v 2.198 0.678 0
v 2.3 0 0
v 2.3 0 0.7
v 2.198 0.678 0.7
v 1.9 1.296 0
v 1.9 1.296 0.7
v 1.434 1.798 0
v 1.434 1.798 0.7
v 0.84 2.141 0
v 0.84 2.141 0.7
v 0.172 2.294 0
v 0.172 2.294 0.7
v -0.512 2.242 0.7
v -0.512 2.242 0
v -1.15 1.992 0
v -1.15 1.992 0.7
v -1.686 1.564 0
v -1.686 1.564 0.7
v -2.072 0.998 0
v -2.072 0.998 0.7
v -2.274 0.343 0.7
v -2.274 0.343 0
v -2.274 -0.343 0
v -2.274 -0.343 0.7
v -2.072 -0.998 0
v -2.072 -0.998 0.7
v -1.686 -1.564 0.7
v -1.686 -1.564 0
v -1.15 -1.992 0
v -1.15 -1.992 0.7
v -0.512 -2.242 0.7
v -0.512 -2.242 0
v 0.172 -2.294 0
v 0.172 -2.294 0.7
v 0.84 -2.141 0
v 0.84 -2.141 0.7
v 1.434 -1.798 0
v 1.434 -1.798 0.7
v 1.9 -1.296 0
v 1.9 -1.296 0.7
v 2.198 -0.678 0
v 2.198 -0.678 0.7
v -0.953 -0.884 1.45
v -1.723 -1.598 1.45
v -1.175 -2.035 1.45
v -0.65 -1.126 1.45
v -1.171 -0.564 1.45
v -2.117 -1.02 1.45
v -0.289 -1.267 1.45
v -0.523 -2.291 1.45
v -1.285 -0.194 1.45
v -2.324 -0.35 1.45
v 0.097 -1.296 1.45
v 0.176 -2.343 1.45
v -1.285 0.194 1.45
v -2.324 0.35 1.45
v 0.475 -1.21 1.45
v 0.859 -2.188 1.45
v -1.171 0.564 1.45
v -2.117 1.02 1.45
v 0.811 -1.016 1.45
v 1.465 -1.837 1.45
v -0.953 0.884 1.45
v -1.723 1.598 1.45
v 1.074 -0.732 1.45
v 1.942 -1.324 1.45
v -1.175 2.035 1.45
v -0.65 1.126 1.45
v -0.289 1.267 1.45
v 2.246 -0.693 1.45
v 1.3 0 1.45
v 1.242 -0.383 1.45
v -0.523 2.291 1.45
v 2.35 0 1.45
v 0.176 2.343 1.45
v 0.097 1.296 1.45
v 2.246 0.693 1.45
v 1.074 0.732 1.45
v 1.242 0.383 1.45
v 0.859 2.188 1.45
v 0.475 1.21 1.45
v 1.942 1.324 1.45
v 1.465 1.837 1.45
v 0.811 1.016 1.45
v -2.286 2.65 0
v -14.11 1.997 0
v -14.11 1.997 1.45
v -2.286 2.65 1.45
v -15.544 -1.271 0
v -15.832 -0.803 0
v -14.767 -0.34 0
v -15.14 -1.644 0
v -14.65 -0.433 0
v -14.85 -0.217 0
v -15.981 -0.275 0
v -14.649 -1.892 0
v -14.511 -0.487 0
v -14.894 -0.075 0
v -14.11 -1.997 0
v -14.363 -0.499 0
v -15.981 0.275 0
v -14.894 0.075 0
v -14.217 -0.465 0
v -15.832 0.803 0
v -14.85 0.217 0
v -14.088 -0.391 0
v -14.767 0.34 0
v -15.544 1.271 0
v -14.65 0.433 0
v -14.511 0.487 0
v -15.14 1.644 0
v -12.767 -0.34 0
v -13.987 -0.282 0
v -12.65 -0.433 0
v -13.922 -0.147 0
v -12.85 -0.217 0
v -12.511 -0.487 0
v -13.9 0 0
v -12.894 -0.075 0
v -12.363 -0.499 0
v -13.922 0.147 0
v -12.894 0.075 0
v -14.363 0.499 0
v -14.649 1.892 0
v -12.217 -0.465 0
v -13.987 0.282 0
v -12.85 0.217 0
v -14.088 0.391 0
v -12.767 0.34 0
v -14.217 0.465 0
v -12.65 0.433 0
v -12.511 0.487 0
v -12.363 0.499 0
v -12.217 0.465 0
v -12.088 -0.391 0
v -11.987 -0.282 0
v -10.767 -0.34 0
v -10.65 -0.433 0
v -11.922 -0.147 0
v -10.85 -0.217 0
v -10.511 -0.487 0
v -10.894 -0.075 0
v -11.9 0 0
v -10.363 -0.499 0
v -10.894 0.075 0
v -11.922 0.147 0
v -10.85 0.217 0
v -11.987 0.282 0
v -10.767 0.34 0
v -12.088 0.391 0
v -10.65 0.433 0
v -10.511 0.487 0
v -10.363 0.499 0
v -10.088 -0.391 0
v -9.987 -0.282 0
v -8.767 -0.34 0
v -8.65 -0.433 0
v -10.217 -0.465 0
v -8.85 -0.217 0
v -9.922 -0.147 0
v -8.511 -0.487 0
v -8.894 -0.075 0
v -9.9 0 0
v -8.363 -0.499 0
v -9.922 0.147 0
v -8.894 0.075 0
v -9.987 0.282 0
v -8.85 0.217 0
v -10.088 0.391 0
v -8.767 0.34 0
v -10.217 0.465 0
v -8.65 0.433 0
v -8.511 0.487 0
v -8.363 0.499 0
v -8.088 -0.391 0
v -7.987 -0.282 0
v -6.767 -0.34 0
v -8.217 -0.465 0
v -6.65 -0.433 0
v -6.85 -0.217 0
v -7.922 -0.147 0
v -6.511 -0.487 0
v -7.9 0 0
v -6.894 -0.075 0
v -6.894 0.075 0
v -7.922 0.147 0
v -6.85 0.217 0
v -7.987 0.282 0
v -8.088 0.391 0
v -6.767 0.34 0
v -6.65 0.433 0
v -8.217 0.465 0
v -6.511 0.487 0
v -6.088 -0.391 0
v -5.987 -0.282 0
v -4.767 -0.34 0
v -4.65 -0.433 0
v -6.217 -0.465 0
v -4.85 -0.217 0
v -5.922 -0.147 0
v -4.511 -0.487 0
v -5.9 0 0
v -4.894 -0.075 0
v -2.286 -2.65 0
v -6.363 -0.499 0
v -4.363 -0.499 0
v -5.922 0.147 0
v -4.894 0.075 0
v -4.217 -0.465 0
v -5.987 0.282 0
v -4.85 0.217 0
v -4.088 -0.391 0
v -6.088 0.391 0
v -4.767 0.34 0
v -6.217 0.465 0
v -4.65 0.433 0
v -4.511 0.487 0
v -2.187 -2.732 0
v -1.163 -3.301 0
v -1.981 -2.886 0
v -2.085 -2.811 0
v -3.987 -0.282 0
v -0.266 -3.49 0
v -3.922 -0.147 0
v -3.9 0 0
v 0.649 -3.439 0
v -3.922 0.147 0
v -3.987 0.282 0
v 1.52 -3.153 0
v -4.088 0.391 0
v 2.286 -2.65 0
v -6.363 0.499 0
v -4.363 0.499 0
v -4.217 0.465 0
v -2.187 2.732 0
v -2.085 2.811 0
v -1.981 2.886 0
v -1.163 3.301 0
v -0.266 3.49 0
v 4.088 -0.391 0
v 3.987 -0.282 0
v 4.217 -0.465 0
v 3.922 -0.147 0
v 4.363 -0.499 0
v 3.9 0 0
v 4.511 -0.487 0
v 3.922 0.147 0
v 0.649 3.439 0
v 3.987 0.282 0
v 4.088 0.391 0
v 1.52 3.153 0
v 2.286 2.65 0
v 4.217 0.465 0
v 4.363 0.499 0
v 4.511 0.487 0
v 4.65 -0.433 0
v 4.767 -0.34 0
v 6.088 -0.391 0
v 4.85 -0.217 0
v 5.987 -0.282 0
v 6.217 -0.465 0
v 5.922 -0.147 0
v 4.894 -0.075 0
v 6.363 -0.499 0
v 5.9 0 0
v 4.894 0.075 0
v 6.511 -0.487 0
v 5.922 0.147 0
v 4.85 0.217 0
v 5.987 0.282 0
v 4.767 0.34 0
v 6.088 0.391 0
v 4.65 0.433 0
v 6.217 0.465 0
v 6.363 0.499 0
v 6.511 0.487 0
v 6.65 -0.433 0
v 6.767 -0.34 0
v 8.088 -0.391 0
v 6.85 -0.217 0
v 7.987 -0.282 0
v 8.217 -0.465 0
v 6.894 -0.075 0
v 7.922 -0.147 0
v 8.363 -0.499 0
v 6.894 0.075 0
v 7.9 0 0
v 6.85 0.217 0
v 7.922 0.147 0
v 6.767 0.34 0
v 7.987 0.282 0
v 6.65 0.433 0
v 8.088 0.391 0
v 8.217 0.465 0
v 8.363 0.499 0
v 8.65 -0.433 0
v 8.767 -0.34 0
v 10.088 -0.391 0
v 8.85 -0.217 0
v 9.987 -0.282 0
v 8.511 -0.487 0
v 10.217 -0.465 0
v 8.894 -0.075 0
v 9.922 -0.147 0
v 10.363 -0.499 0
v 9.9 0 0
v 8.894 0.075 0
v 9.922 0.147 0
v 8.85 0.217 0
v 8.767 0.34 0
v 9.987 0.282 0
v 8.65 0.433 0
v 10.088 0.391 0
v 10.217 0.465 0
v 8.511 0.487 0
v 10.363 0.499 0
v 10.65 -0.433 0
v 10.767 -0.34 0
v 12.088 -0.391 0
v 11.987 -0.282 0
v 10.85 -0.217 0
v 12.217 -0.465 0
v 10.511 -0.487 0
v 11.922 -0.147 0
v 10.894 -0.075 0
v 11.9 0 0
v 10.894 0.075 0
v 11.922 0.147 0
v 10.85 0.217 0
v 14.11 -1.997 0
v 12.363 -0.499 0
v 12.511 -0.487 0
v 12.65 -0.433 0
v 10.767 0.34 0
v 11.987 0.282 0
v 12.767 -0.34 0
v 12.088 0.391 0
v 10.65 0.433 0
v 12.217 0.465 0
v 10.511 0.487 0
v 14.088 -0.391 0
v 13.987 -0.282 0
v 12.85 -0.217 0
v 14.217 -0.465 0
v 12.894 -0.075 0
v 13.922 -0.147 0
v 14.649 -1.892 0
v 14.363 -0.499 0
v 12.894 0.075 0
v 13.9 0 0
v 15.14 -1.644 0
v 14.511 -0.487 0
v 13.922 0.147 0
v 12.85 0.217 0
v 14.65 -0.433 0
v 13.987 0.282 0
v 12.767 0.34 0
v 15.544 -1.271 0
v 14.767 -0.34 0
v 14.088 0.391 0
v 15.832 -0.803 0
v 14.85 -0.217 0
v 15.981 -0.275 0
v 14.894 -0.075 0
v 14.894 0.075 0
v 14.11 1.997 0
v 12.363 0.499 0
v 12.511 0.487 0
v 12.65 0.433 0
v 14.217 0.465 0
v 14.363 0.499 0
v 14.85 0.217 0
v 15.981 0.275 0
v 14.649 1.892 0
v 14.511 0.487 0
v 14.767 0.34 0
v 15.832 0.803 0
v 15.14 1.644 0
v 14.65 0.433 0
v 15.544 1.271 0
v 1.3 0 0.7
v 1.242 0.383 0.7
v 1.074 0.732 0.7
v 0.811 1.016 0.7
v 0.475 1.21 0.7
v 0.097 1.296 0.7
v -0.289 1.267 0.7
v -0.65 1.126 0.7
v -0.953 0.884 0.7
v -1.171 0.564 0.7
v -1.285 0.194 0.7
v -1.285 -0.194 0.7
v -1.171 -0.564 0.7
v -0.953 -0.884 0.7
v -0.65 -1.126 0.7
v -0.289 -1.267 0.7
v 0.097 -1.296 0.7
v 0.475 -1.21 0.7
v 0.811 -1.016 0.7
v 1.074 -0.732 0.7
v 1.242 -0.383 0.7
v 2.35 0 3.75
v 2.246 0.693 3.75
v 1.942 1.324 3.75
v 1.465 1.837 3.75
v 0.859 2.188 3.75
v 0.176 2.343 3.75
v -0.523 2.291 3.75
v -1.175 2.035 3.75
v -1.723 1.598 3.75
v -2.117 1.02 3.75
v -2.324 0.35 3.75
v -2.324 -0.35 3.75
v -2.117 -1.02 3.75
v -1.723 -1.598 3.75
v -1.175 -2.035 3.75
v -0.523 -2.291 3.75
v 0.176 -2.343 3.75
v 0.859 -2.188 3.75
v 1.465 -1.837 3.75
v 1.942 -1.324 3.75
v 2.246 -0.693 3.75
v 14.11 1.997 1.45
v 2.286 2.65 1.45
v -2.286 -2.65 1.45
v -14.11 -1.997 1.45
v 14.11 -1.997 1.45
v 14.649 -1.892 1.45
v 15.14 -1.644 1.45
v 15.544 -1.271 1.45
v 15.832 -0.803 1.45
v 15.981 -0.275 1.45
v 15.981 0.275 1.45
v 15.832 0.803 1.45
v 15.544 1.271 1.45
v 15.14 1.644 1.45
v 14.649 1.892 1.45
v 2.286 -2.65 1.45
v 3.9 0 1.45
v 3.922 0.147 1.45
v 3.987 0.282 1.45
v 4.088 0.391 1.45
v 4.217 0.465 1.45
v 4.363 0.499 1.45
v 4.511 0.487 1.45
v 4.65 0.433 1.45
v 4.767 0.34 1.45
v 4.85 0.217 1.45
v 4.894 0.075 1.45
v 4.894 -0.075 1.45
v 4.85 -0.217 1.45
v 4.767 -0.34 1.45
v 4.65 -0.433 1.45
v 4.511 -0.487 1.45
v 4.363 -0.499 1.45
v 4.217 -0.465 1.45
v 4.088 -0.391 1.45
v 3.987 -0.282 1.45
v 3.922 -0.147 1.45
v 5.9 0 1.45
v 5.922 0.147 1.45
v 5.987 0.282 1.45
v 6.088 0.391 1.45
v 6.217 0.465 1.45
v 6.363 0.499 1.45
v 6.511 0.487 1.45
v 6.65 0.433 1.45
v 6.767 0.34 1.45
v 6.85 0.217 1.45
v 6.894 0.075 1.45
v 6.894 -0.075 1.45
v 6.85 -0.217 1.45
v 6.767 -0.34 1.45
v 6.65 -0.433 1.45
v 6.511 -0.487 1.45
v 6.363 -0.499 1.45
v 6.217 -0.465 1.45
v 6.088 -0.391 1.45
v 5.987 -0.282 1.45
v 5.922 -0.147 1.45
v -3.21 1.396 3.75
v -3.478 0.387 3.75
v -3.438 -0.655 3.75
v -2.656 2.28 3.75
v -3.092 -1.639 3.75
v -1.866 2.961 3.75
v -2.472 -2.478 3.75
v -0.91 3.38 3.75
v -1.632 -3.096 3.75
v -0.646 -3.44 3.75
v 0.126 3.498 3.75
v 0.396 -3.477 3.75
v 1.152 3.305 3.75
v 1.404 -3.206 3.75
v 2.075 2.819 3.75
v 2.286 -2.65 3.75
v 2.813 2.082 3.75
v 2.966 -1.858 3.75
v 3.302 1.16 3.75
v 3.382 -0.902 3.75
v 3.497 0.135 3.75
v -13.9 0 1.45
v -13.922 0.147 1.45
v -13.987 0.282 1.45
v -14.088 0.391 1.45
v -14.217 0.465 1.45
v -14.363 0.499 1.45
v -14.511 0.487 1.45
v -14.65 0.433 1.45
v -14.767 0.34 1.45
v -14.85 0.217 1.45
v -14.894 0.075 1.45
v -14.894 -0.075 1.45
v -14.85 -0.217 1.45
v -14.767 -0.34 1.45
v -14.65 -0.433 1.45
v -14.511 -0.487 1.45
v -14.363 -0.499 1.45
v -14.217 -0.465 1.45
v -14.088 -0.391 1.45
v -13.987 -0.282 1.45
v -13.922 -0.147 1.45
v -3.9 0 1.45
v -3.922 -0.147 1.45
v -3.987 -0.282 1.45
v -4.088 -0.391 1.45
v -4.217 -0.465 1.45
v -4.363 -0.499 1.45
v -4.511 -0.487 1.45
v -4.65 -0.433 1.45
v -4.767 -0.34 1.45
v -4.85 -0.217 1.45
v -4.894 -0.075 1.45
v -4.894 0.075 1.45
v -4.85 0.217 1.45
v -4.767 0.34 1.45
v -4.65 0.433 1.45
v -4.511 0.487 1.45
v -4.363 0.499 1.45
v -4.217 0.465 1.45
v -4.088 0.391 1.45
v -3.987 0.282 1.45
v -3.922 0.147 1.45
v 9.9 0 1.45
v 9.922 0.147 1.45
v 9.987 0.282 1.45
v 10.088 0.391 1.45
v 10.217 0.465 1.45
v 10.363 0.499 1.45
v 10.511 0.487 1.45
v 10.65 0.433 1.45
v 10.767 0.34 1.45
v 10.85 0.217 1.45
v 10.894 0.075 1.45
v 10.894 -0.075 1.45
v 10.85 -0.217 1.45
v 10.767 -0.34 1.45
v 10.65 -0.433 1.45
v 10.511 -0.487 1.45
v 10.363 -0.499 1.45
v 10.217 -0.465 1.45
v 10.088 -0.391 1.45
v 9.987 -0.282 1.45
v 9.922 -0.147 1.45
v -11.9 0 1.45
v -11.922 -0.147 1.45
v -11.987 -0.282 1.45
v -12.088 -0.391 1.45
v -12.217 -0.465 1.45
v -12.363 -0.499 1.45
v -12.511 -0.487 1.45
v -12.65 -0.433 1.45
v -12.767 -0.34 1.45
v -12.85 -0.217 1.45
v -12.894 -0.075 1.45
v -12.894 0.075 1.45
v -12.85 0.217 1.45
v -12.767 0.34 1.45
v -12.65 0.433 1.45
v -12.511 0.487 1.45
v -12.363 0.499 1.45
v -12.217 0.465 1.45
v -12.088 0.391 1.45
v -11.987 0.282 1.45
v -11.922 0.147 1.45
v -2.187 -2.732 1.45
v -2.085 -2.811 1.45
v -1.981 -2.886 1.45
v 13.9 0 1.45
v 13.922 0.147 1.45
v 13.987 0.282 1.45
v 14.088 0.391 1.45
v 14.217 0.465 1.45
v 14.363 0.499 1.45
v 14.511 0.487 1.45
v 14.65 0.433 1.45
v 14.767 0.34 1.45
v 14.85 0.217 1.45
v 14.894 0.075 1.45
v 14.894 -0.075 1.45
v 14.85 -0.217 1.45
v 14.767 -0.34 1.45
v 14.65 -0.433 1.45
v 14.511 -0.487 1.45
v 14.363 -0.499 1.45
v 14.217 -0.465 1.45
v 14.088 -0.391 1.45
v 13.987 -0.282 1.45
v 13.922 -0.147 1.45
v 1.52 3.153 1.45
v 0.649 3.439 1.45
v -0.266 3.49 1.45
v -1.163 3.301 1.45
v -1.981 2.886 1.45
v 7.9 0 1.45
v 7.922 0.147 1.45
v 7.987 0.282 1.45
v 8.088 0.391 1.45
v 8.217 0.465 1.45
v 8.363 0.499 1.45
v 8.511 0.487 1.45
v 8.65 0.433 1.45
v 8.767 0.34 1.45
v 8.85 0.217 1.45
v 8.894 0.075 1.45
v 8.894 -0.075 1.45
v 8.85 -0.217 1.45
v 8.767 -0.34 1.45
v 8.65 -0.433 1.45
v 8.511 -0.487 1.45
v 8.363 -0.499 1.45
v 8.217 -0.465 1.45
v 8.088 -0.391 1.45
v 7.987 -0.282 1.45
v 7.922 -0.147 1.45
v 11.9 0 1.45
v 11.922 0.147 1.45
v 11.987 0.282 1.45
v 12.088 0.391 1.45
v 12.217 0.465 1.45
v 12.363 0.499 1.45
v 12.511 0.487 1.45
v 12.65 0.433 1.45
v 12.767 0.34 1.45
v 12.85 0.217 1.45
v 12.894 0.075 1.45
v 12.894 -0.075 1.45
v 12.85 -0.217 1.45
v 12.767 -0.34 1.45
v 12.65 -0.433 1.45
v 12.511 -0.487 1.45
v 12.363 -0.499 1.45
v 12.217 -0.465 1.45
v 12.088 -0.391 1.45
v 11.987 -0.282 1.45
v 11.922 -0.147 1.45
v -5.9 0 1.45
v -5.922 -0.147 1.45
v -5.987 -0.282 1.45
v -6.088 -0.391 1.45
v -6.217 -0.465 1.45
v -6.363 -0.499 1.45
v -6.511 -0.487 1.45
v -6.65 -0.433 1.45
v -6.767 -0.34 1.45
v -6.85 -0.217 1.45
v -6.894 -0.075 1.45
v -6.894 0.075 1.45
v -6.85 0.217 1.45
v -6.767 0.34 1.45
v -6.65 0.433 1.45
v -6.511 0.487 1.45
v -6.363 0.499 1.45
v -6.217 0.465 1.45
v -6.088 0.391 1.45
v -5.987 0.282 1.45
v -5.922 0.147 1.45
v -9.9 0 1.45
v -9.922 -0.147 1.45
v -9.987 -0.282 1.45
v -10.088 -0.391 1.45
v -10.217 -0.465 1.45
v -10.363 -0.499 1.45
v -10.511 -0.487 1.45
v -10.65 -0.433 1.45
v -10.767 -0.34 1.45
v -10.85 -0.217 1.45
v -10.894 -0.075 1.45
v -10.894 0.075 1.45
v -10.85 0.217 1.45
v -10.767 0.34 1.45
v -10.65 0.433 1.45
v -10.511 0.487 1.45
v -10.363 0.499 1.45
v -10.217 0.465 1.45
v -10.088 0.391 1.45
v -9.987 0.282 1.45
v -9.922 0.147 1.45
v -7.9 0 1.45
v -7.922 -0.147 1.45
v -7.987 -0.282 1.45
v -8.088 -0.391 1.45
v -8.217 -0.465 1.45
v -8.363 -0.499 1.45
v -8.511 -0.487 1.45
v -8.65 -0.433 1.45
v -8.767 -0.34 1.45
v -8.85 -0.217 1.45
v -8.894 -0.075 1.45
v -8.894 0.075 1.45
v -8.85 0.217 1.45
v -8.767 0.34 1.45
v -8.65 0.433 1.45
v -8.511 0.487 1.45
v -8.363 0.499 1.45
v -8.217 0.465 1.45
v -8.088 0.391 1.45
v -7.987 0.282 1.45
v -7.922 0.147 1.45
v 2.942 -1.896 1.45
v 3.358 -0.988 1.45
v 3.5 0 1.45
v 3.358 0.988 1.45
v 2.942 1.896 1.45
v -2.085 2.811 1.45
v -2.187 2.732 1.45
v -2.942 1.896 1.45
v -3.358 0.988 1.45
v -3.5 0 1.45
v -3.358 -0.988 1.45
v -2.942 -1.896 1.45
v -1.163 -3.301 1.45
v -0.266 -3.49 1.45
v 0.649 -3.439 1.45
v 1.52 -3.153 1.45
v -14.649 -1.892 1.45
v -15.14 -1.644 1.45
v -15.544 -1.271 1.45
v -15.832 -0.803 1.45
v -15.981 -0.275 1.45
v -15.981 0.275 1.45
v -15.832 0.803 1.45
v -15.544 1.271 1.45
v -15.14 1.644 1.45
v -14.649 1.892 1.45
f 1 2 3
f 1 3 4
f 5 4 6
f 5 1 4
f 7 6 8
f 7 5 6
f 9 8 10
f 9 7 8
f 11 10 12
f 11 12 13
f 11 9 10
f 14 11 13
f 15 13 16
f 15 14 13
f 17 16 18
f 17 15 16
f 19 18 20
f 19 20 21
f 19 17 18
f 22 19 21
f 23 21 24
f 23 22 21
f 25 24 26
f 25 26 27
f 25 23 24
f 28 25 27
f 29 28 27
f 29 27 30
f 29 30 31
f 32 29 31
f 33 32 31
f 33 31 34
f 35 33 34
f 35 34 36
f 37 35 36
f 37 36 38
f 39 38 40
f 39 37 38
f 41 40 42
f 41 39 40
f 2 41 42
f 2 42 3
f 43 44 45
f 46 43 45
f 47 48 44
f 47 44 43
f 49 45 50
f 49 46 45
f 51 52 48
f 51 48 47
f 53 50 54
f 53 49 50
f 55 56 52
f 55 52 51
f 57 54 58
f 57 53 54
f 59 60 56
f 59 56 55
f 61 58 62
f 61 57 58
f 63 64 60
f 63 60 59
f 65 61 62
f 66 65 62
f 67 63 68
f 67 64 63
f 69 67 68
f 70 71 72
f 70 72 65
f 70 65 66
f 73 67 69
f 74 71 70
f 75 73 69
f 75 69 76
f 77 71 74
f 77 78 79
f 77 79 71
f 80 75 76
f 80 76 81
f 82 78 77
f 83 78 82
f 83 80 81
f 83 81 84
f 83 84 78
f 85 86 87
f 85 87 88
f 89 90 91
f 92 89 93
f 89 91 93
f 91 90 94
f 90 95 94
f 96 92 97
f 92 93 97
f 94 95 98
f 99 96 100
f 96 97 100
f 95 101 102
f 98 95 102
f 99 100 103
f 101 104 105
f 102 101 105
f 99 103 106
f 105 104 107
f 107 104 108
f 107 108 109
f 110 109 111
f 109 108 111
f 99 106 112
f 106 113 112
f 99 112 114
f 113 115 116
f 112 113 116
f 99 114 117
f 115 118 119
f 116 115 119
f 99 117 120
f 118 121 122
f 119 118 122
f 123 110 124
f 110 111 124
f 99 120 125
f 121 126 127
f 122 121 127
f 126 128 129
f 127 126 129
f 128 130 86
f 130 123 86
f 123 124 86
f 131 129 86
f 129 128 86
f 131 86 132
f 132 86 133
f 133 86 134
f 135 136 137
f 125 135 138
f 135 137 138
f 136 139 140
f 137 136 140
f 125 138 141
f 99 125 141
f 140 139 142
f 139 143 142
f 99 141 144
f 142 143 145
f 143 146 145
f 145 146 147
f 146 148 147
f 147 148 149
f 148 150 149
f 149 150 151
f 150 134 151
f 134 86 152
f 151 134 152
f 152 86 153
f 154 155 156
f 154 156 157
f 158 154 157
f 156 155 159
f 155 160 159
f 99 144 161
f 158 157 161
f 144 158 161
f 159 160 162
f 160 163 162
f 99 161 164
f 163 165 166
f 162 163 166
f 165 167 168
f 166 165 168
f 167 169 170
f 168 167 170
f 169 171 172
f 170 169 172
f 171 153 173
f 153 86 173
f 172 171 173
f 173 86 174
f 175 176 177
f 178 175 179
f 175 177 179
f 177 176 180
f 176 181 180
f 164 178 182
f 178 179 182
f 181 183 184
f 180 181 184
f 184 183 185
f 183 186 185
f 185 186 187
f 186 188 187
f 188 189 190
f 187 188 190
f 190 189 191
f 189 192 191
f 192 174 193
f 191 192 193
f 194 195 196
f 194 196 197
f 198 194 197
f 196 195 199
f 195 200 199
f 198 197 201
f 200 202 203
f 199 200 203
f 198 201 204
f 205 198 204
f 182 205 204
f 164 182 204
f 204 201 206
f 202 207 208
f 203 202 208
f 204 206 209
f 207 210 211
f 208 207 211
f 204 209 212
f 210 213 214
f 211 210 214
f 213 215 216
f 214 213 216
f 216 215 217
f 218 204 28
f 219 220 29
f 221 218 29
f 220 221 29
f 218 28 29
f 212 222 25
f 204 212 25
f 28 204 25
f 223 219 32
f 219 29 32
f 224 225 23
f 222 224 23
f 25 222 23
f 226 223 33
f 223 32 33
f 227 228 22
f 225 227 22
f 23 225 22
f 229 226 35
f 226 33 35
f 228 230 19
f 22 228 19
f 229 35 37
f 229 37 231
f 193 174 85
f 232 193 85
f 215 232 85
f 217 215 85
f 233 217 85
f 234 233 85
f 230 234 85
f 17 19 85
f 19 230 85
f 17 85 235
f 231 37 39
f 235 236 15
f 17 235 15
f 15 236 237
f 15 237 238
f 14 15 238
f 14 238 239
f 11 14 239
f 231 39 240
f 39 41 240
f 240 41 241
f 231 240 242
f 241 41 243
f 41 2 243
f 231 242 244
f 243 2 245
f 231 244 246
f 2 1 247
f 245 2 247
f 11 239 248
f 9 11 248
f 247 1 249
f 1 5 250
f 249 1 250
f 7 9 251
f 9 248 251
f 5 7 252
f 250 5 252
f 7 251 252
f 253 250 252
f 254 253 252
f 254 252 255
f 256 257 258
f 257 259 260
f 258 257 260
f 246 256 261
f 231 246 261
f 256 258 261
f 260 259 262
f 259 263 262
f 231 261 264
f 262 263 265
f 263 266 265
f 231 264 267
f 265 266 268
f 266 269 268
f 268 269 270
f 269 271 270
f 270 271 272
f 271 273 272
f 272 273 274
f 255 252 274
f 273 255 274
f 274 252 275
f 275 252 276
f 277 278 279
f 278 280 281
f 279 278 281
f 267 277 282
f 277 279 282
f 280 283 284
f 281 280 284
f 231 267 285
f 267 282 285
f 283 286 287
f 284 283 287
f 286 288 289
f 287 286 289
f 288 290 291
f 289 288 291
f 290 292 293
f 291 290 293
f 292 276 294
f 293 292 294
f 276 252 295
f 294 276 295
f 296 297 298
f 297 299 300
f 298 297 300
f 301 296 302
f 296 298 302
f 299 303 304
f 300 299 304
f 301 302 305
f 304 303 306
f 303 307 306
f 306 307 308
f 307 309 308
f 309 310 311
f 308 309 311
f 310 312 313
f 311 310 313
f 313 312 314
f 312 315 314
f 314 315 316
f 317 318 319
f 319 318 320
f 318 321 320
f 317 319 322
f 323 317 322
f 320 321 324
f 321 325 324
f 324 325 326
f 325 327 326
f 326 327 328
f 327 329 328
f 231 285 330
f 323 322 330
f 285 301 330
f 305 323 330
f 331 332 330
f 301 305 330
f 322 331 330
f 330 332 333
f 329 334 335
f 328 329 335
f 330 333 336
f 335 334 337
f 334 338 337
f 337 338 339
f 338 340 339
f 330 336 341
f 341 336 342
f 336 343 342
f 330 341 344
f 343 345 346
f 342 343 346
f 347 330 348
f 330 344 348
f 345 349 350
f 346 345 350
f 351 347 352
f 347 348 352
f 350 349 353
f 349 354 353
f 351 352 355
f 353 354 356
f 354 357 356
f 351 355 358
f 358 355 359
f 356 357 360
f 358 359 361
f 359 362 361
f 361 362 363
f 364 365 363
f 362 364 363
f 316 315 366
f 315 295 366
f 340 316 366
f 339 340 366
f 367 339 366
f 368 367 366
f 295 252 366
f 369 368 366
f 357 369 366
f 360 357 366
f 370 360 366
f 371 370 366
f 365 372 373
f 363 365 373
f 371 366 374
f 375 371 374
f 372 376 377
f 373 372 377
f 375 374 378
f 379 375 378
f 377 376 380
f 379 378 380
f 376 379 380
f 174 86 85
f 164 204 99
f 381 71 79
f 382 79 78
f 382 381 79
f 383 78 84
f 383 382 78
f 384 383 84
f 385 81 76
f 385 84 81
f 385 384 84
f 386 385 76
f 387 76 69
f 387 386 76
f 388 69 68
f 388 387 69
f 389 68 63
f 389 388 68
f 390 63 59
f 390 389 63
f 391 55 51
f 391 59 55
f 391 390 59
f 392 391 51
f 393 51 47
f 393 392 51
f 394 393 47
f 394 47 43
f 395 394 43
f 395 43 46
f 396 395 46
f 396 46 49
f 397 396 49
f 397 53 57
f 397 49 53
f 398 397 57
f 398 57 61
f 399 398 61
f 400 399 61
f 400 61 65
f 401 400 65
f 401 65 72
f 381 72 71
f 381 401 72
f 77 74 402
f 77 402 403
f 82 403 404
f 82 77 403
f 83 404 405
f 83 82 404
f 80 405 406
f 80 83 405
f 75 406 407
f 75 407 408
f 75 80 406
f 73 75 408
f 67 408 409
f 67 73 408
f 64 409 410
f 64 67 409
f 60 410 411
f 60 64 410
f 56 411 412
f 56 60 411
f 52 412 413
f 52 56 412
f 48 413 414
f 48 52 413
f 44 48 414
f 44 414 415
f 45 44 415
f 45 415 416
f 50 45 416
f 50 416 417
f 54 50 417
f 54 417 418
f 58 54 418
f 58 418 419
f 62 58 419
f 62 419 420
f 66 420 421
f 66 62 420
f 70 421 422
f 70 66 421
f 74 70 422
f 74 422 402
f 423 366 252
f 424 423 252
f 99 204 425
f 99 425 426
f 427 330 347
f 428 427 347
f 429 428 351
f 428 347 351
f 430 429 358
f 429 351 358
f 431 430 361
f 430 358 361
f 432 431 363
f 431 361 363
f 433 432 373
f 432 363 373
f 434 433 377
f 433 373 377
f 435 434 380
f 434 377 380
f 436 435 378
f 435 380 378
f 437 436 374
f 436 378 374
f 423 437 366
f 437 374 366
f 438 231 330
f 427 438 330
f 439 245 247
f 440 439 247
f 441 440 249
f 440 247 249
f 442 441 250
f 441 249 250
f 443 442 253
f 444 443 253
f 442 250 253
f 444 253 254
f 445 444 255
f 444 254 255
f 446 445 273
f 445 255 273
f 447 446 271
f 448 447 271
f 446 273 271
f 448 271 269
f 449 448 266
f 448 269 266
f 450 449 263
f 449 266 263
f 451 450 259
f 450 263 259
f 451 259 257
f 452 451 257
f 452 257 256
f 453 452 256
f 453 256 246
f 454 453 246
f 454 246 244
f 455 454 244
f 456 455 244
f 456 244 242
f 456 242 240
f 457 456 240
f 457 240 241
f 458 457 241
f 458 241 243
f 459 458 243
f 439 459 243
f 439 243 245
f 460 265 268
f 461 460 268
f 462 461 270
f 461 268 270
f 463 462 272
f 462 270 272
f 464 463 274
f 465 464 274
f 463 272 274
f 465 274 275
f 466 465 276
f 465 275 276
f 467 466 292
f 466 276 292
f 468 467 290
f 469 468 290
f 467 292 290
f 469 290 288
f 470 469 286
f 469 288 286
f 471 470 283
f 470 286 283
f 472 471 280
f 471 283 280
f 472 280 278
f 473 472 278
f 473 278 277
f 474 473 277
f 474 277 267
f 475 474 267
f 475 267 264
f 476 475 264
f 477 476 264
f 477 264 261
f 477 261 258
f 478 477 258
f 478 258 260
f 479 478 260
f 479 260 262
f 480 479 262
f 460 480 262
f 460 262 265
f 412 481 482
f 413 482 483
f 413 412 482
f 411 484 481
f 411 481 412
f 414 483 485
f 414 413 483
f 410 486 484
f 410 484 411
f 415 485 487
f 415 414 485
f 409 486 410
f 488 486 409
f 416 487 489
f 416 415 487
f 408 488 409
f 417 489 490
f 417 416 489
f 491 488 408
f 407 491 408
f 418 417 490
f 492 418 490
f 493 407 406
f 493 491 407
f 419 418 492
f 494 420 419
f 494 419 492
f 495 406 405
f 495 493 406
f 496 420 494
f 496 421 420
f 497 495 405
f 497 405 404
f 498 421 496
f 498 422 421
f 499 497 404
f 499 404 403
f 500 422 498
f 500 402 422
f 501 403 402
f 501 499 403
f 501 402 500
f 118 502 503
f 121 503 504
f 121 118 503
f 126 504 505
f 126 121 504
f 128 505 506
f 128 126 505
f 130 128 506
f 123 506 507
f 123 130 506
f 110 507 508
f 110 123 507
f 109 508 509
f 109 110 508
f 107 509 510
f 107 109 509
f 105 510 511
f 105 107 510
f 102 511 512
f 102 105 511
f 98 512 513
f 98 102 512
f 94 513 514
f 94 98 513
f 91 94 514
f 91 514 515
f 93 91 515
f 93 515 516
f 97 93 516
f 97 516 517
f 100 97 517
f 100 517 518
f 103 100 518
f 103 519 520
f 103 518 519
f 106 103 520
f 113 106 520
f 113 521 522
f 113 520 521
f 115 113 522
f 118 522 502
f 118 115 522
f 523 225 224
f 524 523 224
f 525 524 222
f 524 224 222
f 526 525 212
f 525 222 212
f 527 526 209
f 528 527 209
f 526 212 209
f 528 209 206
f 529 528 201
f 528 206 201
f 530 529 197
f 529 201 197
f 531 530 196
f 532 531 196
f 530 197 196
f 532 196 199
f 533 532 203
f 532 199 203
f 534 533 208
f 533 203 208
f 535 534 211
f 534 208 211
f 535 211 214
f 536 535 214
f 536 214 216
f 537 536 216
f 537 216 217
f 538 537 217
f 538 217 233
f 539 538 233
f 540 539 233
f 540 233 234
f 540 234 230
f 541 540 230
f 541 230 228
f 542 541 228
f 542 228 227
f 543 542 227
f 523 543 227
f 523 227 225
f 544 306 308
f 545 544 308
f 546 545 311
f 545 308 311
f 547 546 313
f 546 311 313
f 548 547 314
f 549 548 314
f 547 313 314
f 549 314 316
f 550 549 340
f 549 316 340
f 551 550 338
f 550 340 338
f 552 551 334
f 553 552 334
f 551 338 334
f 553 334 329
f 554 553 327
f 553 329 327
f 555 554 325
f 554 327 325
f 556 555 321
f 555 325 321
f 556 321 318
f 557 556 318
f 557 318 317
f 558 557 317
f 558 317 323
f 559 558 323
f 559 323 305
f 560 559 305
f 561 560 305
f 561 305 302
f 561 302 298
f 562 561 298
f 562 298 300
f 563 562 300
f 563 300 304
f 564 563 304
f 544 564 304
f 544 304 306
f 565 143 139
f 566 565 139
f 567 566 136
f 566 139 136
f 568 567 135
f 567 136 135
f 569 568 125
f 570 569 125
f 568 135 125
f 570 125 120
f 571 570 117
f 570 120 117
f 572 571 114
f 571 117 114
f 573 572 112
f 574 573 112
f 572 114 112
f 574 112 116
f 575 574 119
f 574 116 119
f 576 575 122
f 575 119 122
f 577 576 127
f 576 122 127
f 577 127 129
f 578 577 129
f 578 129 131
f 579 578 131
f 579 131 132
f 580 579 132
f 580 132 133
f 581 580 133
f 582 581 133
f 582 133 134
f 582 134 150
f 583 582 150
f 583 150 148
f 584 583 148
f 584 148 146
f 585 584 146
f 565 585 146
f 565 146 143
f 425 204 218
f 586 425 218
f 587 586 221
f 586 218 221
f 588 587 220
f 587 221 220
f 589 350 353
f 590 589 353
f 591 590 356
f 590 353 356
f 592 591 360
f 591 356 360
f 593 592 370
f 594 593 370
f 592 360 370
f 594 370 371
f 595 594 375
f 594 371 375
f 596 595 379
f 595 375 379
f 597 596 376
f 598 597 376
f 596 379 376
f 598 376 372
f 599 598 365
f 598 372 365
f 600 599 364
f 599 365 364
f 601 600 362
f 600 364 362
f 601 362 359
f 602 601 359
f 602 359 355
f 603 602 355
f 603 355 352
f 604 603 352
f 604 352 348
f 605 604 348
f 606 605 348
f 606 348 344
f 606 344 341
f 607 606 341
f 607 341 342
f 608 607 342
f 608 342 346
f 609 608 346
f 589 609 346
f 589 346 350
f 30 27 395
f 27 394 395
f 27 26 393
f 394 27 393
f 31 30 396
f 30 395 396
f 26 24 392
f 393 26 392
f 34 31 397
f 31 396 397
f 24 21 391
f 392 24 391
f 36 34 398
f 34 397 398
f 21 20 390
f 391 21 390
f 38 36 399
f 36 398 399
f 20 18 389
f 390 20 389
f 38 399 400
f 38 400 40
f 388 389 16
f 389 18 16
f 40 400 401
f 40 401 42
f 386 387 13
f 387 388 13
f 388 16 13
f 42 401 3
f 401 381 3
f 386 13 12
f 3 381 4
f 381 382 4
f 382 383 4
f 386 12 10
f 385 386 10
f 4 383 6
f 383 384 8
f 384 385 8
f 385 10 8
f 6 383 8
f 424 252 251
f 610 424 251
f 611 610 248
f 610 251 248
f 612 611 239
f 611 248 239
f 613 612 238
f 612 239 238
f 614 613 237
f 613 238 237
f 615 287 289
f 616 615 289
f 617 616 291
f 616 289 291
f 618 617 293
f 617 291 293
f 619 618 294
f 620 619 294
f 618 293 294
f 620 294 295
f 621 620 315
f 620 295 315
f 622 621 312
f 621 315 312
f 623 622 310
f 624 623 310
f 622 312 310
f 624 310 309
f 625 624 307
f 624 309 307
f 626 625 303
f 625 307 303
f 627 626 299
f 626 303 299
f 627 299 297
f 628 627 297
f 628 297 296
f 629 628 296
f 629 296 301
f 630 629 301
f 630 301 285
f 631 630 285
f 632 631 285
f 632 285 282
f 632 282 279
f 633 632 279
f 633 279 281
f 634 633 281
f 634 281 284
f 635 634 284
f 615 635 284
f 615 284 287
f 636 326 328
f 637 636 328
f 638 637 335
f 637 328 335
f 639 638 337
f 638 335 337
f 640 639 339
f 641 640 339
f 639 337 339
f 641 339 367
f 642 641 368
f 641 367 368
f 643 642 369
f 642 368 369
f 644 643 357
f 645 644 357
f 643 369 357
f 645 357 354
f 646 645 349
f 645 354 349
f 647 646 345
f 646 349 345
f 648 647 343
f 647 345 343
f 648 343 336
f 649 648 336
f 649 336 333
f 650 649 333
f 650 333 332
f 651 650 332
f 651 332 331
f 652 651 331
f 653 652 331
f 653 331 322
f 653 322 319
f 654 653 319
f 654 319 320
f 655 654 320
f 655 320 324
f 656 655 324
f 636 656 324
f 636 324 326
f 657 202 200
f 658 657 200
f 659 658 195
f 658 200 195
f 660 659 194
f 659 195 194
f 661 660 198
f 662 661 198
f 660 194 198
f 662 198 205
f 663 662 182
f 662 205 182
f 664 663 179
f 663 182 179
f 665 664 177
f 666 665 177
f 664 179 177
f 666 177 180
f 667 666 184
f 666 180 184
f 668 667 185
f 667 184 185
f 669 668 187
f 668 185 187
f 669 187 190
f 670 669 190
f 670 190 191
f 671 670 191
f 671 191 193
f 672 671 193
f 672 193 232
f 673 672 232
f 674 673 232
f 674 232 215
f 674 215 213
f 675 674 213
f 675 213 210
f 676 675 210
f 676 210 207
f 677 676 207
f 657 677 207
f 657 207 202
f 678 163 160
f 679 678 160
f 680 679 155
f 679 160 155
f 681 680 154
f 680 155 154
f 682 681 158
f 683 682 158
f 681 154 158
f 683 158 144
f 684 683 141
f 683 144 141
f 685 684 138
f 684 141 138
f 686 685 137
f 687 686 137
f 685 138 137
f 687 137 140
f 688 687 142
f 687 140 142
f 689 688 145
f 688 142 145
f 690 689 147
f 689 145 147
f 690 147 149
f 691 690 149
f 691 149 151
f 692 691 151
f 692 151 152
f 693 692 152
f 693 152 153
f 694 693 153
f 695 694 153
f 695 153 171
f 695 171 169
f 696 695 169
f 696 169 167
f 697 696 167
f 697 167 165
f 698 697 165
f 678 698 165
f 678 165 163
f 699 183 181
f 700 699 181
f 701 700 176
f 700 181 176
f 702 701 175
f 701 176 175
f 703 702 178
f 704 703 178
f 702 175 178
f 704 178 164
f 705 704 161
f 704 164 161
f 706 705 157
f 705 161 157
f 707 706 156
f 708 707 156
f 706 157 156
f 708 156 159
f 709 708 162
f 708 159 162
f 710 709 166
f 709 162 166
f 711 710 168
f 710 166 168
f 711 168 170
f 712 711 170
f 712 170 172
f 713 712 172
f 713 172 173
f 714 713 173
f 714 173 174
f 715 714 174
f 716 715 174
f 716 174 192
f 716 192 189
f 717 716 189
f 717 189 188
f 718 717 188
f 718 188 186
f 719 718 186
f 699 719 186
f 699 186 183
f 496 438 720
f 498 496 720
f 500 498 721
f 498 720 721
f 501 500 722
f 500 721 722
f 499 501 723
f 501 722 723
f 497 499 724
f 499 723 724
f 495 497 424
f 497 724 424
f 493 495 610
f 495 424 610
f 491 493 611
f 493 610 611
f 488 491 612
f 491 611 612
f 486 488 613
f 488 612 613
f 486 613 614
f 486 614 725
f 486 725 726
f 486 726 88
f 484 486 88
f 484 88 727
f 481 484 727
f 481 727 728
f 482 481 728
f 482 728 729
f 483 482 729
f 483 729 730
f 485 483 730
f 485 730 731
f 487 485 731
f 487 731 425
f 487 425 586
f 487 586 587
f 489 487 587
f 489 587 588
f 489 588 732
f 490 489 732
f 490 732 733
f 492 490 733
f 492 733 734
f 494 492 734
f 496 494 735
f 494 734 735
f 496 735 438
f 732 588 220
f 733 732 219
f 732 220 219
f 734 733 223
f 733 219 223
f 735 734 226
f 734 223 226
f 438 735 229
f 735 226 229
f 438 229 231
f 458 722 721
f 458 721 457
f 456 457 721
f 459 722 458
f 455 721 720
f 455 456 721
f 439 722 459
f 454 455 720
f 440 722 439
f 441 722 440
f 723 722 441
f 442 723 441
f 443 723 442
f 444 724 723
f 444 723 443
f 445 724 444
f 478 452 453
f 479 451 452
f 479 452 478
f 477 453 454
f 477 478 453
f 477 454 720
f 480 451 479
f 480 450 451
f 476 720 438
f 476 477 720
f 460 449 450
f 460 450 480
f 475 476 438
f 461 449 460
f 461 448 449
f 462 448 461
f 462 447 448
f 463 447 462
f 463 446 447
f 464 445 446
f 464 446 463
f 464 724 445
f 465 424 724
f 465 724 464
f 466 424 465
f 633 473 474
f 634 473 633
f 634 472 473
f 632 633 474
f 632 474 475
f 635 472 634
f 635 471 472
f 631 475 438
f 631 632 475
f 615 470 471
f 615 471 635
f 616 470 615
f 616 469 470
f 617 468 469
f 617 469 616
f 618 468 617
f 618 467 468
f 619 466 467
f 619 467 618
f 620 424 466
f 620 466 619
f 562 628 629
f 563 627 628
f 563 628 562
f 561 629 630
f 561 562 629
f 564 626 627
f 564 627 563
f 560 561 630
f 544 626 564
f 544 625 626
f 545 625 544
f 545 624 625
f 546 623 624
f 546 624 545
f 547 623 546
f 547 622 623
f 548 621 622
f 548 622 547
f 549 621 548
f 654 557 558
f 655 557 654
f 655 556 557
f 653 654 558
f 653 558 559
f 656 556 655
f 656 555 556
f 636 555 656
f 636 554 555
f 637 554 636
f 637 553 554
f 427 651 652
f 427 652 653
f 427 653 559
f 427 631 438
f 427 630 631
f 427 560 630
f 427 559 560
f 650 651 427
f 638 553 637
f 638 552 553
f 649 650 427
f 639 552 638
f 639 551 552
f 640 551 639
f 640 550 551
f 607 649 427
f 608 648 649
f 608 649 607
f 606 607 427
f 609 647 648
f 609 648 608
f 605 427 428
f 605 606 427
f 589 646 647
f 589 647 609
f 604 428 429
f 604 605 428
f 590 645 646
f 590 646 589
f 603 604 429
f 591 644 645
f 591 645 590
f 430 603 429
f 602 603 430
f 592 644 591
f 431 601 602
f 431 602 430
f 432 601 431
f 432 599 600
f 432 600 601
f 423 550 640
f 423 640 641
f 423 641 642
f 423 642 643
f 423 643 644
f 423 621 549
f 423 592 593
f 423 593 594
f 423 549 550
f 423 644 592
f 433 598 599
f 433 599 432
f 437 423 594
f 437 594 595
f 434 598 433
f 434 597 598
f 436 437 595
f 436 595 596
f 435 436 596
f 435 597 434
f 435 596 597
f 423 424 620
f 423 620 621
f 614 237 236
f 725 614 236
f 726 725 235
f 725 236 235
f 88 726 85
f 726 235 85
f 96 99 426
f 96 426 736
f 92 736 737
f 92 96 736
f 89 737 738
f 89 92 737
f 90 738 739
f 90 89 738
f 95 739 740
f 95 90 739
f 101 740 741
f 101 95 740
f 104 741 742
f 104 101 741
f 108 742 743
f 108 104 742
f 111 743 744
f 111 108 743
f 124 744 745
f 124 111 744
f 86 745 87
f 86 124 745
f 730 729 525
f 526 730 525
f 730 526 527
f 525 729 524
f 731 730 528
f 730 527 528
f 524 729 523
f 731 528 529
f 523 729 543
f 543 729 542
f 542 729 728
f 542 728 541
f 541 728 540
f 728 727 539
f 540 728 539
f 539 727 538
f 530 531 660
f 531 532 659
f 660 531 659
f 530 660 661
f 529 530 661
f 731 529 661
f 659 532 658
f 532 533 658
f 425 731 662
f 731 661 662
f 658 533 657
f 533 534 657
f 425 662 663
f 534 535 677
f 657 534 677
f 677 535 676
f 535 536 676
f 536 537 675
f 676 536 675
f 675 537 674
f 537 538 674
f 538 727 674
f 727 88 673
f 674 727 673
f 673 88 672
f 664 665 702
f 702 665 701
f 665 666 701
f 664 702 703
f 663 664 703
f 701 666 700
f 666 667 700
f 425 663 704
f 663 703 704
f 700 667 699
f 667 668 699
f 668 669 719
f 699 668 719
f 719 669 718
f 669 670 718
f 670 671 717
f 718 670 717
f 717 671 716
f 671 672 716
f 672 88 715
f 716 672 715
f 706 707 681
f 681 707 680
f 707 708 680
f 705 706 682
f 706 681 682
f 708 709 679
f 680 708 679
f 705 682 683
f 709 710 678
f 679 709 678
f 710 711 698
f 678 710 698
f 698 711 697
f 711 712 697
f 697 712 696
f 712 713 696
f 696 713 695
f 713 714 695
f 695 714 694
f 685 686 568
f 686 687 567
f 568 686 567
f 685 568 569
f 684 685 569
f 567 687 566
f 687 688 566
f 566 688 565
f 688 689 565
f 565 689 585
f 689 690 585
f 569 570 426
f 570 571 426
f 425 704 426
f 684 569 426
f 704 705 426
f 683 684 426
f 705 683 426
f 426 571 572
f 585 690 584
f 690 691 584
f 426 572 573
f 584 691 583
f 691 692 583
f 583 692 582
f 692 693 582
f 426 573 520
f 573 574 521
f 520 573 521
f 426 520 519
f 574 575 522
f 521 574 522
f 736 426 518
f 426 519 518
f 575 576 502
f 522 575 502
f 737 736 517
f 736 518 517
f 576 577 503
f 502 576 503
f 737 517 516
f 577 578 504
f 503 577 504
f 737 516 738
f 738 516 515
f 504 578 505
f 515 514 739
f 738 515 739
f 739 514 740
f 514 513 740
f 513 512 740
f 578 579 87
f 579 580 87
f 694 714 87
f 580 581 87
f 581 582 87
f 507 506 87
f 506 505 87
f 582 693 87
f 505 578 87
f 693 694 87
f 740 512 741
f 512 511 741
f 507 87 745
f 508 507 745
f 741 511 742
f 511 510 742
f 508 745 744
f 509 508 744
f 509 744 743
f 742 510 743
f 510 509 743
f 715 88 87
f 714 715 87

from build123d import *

# Parameters (mm, degrees)
SKETCH_1_R               = 2.772053215
SKETCH_1_R_2             = 2
SKETCH_1_R_3             = 3.5
EXTRUDE_1_DEPTH          = 1.45
SKETCH_2_R               = 3.5
SKETCH_2_R_2             = 2.35
EXTRUDE_2_DEPTH          = 2.3
SKETCH_3_R               = 2.3
CUT_EXTRUDE_1_DEPTH      = 0.7
SKETCH_4_R               = 1.3
CUT_EXTRUDE_2_DEPTH      = 17.659906963
SKETCH_5_R               = 0.5
CUT_EXTRUDE_3_DEPTH      = 17.8021576
PATTERN_LINEAR_1_COUNT   = 6
PATTERN_LINEAR_1_PITCH   = 2
MIRROR_1_COPY_1_SKETCH_R = 0.5
MIRROR_1_COPY_1_DEPTH    = 17.8021576
MIRROR_1_COPY_2_SKETCH_R = 0.5
MIRROR_1_COPY_2_DEPTH    = 17.8021576
MIRROR_1_COPY_3_SKETCH_R = 0.5
MIRROR_1_COPY_3_DEPTH    = 17.8021576
MIRROR_1_COPY_4_SKETCH_R = 0.5
MIRROR_1_COPY_4_DEPTH    = 17.8021576
MIRROR_1_COPY_5_SKETCH_R = 0.5
MIRROR_1_COPY_5_DEPTH    = 17.8021576


with BuildPart() as part:
    # 草图1 → 凸台-拉伸1 (new body)
    with BuildSketch(Plane.XY):
        with BuildLine():
            Line((0.152869496, 2.767834884), (-1.980633731, 2.885669771))
            ThreePointArc((-1.980633731, 2.885669771), (-3.5, 0), (-1.980633731, -2.885669771))
            Line((-1.980633731, -2.885669771), (0.152869466, -2.767834886))
            ThreePointArc((0.152869466, -2.767834886), (-2.772053215, 1.5e-08), (0.152869496, 2.767834884))
        make_face()
        with BuildLine():
            Line((2.286372673, 2.65), (0.152869496, 2.767834884))
            ThreePointArc((0.152869496, 2.767834884), (2.013459884, 1.90532368), (2.772053215, 0))
            ThreePointArc((2.772053215, 0), (2.013459873, -1.905323691), (0.152869466, -2.767834886))
            Line((0.152869466, -2.767834886), (2.286372673, -2.65))
            ThreePointArc((2.286372673, -2.65), (3.182161557, -1.457342726), (3.5, 0))
            ThreePointArc((3.5, 0), (3.182161557, 1.457342726), (2.286372673, 2.65))
        make_face()
        Circle(SKETCH_1_R)
        with BuildLine():
            ThreePointArc((2.286372673, 2.65), (0.193013304, 3.494673928), (-1.980633731, 2.885669771))
            Line((-1.980633731, 2.885669771), (0.152869496, 2.767834884))
            Line((0.152869496, 2.767834884), (2.286372673, 2.65))
        make_face()
        with BuildLine():
            Line((0.152869466, -2.767834886), (-1.980633731, -2.885669771))
            ThreePointArc((-1.980633731, -2.885669771), (0.193013304, -3.494673928), (2.286372673, -2.65))
            Line((2.286372673, -2.65), (0.152869466, -2.767834886))
        make_face()
        with BuildLine():
            Line((14.11029331, 1.996956531), (2.286372673, 2.65))
            ThreePointArc((2.286372673, 2.65), (3.182161557, 1.457342726), (3.5, 0))
            ThreePointArc((3.5, 0), (3.182161557, -1.457342726), (2.286372673, -2.65))
            Line((2.286372673, -2.65), (14.110293326, -1.99695653))
            ThreePointArc((14.110293326, -1.99695653), (12, -8e-09), (14.11029331, 1.996956531))
        make_face()
        with Locations((14, 0)):
            Circle(SKETCH_1_R_2)
        Circle(SKETCH_1_R_3)
    extrude_1 = extrude(amount=EXTRUDE_1_DEPTH)

    # 草图2 → 凸台-拉伸2 (add)
    with BuildSketch(Plane.XY.offset(1.45)):
        with Locations(Location((0, 0, 0), (0, 0, 310.787038193))):
            Circle(SKETCH_2_R)
        Circle(SKETCH_2_R_2, mode=Mode.SUBTRACT)
    extrude(amount=EXTRUDE_2_DEPTH)

    # 草图3 → 切除-拉伸1 (cut)
    with BuildSketch(Plane(origin=(0, 0, 0), x_dir=(-1, 0, 0), z_dir=(0, 0, -1))):
        Circle(SKETCH_3_R)
    cut_extrude_1 = extrude(amount=-CUT_EXTRUDE_1_DEPTH, mode=Mode.SUBTRACT)

    # 草图4 → 切除-拉伸2 (cut, through all)
    with BuildSketch(Plane(origin=(0, 0, 0.7), x_dir=(-1, 0, 0), z_dir=(0, 0, -1))):
        Circle(SKETCH_4_R)
    cut_extrude_2 = extrude(amount=-CUT_EXTRUDE_2_DEPTH, mode=Mode.SUBTRACT)

    # 草图5 → 切除-拉伸3 (cut, through all)
    with BuildSketch(Plane(origin=(0, 0, 0), x_dir=(-1, 0, 0), z_dir=(0, 0, -1))):
        with Locations((-14.4, 0)):
            Circle(SKETCH_5_R)
    cut_extrude_3 = extrude(amount=-CUT_EXTRUDE_3_DEPTH, mode=Mode.SUBTRACT)

    # 阵列(线性)1: 切除-拉伸3 ×6
    with Locations(*[(-i * PATTERN_LINEAR_1_PITCH, 0, 0) for i in range(1, PATTERN_LINEAR_1_COUNT)]):
        add(cut_extrude_3, mode=Mode.SUBTRACT)

    # 镜向1: 凸台-拉伸1, 切除-拉伸1, 切除-拉伸2, 切除-拉伸3 across plane
    add(extrude_1.mirror(Plane(origin=(0, 0, 0), x_dir=(0, 0, 1), z_dir=(1, 0, 0))))
    add(cut_extrude_1.mirror(Plane(origin=(0, 0, 0), x_dir=(0, 0, 1), z_dir=(1, 0, 0))), mode=Mode.SUBTRACT)
    add(cut_extrude_2.mirror(Plane(origin=(0, 0, 0), x_dir=(0, 0, 1), z_dir=(1, 0, 0))), mode=Mode.SUBTRACT)
    add(cut_extrude_3.mirror(Plane(origin=(0, 0, 0), x_dir=(0, 0, 1), z_dir=(1, 0, 0))), mode=Mode.SUBTRACT)

    # 镜向1 copy 1 sketch → 镜向1 copy 1 (cut, through all)
    with BuildSketch(Plane(origin=(2, 0, 0), x_dir=(1, 0, 0), z_dir=(0, 0, -1))):
        with Locations((-14.4, 0)):
            Circle(MIRROR_1_COPY_1_SKETCH_R)
    extrude(amount=-MIRROR_1_COPY_1_DEPTH, mode=Mode.SUBTRACT)

    # 镜向1 copy 2 sketch → 镜向1 copy 2 (cut, through all)
    with BuildSketch(Plane(origin=(4, 0, 0), x_dir=(1, 0, 0), z_dir=(0, 0, -1))):
        with Locations((-14.4, 0)):
            Circle(MIRROR_1_COPY_2_SKETCH_R)
    extrude(amount=-MIRROR_1_COPY_2_DEPTH, mode=Mode.SUBTRACT)

    # 镜向1 copy 3 sketch → 镜向1 copy 3 (cut, through all)
    with BuildSketch(Plane(origin=(6, 0, 0), x_dir=(1, 0, 0), z_dir=(0, 0, -1))):
        with Locations((-14.4, 0)):
            Circle(MIRROR_1_COPY_3_SKETCH_R)
    extrude(amount=-MIRROR_1_COPY_3_DEPTH, mode=Mode.SUBTRACT)

    # 镜向1 copy 4 sketch → 镜向1 copy 4 (cut, through all)
    with BuildSketch(Plane(origin=(8, 0, 0), x_dir=(1, 0, 0), z_dir=(0, 0, -1))):
        with Locations((-14.4, 0)):
            Circle(MIRROR_1_COPY_4_SKETCH_R)
    extrude(amount=-MIRROR_1_COPY_4_DEPTH, mode=Mode.SUBTRACT)

    # 镜向1 copy 5 sketch → 镜向1 copy 5 (cut, through all)
    with BuildSketch(Plane(origin=(10, 0, 0), x_dir=(1, 0, 0), z_dir=(0, 0, -1))):
        with Locations((-14.4, 0)):
            Circle(MIRROR_1_COPY_5_SKETCH_R)
    extrude(amount=-MIRROR_1_COPY_5_DEPTH, mode=Mode.SUBTRACT)


solid = part.part
